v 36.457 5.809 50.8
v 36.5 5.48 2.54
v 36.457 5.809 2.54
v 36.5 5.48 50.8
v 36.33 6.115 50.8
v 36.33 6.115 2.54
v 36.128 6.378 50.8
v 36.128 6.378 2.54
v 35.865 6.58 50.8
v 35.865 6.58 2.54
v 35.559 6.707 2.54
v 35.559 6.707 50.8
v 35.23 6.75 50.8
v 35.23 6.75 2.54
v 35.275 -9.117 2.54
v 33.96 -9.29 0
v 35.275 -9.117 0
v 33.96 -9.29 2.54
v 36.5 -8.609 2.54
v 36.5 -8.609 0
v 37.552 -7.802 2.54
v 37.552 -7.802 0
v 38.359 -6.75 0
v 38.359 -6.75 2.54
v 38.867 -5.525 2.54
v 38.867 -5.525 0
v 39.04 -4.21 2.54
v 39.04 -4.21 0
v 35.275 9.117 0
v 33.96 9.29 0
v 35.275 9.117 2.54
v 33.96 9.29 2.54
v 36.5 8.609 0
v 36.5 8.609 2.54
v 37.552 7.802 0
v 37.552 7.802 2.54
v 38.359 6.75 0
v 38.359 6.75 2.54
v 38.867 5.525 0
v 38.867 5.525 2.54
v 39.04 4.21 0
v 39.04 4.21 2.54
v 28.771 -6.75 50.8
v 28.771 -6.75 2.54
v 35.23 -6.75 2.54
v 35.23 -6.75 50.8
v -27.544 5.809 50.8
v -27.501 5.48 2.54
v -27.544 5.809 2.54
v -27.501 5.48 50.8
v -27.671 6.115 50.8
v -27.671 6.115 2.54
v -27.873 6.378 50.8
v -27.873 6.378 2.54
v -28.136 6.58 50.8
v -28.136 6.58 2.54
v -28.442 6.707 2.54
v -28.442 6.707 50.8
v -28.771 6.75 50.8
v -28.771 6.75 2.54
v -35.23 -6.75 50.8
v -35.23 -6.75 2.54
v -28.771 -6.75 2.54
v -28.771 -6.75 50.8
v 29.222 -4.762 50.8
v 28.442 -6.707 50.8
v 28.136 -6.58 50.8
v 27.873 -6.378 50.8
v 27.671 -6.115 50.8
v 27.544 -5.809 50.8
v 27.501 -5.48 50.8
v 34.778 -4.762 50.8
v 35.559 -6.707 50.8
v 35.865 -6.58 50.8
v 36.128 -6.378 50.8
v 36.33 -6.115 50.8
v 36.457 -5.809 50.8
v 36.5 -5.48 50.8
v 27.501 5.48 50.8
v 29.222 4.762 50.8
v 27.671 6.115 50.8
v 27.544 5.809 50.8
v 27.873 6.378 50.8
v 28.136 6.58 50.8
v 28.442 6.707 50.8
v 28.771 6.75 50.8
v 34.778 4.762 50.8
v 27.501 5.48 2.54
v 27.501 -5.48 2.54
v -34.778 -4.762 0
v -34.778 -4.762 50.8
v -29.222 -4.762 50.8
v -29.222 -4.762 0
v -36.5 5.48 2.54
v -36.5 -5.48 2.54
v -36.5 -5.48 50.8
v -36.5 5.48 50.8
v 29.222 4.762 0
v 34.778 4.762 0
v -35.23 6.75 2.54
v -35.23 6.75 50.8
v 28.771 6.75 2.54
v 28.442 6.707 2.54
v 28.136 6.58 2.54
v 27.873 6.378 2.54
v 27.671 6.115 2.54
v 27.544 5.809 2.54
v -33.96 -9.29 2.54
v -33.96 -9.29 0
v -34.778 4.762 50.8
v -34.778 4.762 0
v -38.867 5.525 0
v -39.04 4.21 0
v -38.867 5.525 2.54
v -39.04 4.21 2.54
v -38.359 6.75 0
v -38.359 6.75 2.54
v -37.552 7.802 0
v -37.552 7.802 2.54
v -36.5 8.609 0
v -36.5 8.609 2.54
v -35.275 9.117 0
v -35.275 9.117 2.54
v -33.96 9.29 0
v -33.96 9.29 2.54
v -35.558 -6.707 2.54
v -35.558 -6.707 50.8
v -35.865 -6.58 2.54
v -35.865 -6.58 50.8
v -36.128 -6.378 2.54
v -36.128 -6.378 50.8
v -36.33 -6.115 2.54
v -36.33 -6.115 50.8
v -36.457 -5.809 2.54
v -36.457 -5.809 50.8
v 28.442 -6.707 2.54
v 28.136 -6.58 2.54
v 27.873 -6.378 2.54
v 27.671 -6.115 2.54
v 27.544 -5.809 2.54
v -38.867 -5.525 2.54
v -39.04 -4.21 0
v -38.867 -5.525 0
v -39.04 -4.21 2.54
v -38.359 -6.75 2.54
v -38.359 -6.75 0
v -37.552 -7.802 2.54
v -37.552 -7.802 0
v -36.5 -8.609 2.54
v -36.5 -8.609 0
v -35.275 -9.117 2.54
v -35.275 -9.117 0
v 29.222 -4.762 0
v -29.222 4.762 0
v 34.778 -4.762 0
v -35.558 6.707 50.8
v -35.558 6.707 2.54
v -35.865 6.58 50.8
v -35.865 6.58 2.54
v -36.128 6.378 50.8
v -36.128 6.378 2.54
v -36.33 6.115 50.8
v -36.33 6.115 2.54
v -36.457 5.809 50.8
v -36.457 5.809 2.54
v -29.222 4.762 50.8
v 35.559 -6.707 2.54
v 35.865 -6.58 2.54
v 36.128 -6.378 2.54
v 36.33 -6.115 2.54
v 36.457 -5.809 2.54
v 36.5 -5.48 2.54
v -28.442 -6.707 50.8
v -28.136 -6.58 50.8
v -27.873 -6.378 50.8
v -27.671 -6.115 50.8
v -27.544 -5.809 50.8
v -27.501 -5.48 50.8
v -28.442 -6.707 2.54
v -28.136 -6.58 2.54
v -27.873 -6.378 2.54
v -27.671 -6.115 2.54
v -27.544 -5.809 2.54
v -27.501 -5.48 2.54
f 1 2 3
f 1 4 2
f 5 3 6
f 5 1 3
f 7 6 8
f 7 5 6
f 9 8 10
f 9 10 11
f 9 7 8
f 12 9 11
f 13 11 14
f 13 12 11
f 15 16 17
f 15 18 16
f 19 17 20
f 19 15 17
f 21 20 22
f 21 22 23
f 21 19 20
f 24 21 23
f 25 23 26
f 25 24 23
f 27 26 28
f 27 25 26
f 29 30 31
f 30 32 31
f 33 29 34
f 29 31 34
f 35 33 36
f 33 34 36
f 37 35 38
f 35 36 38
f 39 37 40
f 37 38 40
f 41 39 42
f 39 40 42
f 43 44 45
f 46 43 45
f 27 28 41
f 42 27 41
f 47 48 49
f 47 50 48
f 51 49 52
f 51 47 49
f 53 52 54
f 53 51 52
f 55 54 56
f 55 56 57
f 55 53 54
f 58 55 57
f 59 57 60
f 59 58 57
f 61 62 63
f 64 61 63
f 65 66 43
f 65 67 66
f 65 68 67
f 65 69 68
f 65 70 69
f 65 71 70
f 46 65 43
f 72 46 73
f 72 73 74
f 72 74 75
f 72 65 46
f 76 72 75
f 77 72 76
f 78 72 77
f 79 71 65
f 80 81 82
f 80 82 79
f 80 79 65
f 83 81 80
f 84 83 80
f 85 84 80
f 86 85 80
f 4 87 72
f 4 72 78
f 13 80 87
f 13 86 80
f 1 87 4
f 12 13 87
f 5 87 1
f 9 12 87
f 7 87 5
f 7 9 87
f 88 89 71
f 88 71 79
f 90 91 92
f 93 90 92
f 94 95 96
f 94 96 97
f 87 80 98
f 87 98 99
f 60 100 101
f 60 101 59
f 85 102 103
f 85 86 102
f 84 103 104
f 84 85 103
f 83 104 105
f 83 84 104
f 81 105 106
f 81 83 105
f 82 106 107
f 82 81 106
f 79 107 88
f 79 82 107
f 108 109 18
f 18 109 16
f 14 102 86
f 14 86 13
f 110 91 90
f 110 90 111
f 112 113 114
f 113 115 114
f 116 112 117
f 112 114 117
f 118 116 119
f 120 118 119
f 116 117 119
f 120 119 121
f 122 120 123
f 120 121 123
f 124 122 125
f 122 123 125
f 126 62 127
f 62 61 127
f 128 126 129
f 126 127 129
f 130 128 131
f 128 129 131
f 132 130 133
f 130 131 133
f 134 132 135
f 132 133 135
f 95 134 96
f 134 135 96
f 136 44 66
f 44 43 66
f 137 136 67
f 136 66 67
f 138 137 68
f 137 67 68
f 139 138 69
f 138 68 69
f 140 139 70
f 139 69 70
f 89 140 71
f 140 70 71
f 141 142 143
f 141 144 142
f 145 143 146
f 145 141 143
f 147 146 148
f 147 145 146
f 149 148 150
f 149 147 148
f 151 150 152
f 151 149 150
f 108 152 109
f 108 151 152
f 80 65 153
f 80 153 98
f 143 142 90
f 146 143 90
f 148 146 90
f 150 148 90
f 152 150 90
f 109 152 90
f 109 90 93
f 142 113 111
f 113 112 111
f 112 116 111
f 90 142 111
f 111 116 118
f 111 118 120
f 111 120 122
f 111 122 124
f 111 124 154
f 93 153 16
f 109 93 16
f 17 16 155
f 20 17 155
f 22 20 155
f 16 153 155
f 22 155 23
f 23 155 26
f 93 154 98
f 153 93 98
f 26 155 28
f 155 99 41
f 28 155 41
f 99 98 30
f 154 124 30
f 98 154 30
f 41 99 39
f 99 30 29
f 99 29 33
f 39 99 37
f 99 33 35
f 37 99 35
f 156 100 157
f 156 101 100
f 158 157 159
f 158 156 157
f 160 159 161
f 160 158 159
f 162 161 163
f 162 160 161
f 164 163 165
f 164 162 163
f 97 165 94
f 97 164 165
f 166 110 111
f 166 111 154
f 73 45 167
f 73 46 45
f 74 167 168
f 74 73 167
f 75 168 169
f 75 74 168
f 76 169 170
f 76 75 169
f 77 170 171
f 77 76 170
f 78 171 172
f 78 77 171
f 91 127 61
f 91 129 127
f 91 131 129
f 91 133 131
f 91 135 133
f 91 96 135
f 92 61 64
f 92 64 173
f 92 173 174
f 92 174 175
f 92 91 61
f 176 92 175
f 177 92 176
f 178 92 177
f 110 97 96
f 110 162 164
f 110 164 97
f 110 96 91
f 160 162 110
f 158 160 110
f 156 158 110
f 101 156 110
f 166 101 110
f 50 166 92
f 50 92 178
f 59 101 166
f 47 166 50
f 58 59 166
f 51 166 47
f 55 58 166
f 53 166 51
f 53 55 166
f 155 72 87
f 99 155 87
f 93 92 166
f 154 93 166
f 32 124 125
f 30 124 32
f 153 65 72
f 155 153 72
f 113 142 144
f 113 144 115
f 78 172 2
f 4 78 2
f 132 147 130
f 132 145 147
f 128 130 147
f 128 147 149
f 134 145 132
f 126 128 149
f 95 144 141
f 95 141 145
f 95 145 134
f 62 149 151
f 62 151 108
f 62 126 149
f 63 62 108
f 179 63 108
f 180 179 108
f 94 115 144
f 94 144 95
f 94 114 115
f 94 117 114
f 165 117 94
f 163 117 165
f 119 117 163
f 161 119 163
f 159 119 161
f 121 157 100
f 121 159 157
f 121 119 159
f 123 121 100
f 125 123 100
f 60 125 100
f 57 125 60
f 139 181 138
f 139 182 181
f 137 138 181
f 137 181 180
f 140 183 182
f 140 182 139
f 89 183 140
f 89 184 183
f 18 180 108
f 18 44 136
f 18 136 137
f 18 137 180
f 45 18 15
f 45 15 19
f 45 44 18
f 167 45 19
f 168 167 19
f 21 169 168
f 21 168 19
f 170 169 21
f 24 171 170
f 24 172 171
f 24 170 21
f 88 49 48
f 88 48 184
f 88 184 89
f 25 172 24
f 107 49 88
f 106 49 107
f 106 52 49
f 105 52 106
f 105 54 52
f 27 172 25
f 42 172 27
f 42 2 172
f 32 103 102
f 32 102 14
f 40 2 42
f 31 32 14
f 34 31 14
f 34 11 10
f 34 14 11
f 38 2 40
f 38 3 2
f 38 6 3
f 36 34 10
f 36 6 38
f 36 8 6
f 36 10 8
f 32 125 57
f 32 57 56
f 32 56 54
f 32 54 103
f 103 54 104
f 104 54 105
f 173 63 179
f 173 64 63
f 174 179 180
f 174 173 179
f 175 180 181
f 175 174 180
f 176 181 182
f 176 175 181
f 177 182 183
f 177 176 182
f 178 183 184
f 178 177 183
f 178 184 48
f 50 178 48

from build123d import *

# Parameters (mm, degrees)
F0_W     = 78.0796
F0_H     = 18.5801
F1_DEPTH = 2.54
F2_W     = 8.99922
F2_H     = 13.5001
F2_W_2   = 8.999221
F3_DEPTH = 48.26
F4_R     = 5.08
F5_R     = 1.27
F6_W     = 5.55625
F6_H     = 9.525
F7_DEPTH = 76.2
F8_W     = 5.55625
F8_H     = 9.525
F9_DEPTH = 76.2


with BuildPart() as f1:
    # F0 (on Top) → F1 (new body)
    with BuildSketch(Plane.XY):
        Rectangle(F0_W, F0_H)
    extrude(amount=F1_DEPTH)

    # F2 (on face) → F3 (join)
    with BuildSketch(Plane.XY.offset(2.54)):
        with Locations((32.00019, 0)):
            Rectangle(F2_W, F2_H)
        with Locations((-32.000189, 0)):
            Rectangle(F2_W_2, F2_H)
    extrude(amount=F3_DEPTH)

    # F4
    f4_edges = [f1.edges().sort_by_distance(p)[0] for p in [
        (39.0398, 9.29005, 1.27),
        (39.0398, -9.29005, 1.27),
        (-39.0398, -9.29005, 1.27),
        (-39.0398, 9.29005, 1.27),
    ]]
    fillet(f4_edges, radius=F4_R)

    # F5
    f5_edges = [f1.edges().sort_by_distance(p)[0] for p in [
        (36.4998, 6.75005, 26.67),
        (36.4998, -6.75005, 26.67),
        (27.50058, -6.75005, 26.67),
        (27.50058, 6.75005, 26.67),
        (-27.500579, -6.75005, 26.67),
        (-36.4998, -6.75005, 26.67),
        (-36.4998, 6.75005, 26.67),
        (-27.500579, 6.75005, 26.67),
    ]]
    fillet(f5_edges, radius=F5_R)

    # F6 (on face) → F7 (cut)
    with BuildSketch(Plane.XY.offset(50.8)):
        with Locations((32.00019, 0)):
            Rectangle(F6_W, F6_H)
    extrude(amount=-F7_DEPTH, mode=Mode.SUBTRACT)

    # F8 (on face) → F9 (cut)
    with BuildSketch(Plane.XY.offset(50.8)):
        with Locations((-32.000189, 0)):
            Rectangle(F8_W, F8_H)
    extrude(amount=-F9_DEPTH, mode=Mode.SUBTRACT)


solid = f1.part
